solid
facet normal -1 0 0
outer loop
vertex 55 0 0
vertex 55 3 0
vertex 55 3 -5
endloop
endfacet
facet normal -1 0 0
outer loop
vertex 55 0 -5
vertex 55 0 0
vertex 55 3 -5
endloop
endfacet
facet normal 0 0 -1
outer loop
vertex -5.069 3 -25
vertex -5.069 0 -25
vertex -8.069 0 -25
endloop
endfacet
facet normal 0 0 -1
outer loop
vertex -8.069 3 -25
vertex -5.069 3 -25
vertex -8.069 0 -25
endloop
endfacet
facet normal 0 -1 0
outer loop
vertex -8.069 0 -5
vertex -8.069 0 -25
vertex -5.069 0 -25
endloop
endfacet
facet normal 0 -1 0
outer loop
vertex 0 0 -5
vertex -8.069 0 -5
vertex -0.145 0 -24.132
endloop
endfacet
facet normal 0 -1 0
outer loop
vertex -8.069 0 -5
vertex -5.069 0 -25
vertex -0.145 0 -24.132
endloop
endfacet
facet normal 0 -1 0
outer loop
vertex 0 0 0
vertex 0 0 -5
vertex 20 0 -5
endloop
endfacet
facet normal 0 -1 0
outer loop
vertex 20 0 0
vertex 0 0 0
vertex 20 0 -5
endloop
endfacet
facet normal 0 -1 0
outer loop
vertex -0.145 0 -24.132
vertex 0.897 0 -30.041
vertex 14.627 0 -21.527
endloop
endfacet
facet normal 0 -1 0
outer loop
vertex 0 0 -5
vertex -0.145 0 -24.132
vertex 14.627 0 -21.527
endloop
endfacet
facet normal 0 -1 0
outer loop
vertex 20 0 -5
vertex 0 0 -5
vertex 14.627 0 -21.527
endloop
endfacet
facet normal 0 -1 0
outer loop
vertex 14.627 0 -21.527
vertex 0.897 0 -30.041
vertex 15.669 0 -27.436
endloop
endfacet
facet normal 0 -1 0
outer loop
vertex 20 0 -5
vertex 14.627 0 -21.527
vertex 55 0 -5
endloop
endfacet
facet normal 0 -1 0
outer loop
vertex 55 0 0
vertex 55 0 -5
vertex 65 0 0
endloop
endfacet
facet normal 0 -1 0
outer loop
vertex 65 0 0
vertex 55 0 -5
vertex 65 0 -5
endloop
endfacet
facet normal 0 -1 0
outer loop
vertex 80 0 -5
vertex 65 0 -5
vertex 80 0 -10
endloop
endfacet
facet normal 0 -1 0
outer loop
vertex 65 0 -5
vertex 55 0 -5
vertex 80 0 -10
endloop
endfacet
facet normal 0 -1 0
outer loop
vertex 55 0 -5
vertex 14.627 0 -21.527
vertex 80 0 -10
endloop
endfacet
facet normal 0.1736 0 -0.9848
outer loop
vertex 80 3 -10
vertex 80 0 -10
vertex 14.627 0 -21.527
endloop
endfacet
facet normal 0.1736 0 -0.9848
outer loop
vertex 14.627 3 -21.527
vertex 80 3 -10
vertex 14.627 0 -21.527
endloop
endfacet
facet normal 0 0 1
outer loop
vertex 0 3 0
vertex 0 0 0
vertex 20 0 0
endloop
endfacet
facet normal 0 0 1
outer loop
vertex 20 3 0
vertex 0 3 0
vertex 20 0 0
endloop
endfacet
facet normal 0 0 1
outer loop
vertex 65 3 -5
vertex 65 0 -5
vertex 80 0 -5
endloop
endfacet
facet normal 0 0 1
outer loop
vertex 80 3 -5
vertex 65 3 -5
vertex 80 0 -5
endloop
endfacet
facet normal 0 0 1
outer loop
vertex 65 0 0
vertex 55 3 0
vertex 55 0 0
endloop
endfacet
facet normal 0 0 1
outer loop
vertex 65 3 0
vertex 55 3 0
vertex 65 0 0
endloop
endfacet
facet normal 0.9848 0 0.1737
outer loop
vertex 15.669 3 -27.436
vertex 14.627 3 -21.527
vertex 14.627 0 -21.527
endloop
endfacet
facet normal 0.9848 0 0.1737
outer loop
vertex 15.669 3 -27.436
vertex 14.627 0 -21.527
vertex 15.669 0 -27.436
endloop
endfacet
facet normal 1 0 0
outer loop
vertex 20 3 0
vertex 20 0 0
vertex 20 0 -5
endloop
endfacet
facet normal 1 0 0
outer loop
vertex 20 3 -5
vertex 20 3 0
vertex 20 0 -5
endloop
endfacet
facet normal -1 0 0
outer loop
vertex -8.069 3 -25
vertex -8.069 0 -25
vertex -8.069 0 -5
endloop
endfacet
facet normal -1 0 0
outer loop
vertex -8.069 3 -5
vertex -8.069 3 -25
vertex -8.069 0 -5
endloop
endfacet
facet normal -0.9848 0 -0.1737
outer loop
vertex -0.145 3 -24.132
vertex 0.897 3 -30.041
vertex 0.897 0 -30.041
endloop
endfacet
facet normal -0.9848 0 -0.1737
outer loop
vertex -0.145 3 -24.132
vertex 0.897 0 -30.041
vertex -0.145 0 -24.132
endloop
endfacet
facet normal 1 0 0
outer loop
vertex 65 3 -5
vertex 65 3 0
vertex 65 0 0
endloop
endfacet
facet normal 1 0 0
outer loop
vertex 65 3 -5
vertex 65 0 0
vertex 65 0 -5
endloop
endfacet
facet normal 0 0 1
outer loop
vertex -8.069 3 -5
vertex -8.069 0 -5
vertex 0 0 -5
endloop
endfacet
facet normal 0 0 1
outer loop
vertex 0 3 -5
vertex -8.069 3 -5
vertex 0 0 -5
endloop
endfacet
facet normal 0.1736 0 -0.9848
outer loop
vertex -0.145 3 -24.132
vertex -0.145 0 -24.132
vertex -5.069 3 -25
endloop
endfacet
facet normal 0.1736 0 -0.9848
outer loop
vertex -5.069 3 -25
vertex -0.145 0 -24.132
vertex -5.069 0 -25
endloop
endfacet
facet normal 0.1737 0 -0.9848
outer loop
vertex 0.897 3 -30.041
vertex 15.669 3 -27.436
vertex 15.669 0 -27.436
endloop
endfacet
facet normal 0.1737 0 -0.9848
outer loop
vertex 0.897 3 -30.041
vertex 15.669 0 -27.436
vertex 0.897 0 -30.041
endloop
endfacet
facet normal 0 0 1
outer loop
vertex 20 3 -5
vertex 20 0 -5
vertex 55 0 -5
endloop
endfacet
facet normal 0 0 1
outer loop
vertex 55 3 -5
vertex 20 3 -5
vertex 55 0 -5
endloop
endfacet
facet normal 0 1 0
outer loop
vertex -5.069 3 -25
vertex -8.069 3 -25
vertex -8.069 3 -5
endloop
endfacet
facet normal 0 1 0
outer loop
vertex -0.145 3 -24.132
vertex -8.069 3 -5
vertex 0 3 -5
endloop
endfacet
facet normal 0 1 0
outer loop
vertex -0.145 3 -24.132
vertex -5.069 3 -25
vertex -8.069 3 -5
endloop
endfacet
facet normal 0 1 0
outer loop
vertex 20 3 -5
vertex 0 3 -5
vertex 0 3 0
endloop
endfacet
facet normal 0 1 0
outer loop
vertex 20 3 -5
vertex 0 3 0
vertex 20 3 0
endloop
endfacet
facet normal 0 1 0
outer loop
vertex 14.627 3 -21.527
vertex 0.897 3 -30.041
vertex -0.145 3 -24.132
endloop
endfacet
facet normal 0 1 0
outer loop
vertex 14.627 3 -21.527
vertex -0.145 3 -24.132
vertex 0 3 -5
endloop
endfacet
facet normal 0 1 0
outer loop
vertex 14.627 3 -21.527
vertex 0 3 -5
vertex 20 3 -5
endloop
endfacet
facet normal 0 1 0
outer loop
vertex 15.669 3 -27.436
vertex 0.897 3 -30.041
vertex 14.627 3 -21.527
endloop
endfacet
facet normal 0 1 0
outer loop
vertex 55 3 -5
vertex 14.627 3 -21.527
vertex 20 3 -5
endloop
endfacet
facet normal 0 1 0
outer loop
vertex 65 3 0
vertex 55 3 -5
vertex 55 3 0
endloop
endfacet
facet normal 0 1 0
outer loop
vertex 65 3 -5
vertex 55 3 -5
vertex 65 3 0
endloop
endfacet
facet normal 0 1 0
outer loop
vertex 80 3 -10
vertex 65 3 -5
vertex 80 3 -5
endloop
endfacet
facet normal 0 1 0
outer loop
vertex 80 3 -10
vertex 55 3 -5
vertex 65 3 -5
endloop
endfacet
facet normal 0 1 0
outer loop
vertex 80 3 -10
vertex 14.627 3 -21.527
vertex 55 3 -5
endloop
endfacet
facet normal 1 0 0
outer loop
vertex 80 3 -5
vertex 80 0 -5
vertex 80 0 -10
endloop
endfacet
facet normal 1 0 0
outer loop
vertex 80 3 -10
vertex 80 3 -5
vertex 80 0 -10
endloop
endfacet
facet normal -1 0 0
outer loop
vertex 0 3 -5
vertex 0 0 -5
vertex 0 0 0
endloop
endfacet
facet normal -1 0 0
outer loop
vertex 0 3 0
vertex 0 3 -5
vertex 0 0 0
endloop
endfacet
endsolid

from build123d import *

# Parameters (mm, degrees)
BOSS_EXTRUDE1_DEPTH = 3
SKETCH2_W           = 10
SKETCH2_H           = 5
BOSS_EXTRUDE2_DEPTH = 3
BOSS_EXTRUDE3_DEPTH = 3


with BuildPart() as part:
    # Sketch1 → Boss-Extrude1 (new body)
    with BuildSketch(Plane(origin=(0, 0, 0), x_dir=(1, 0, 0), z_dir=(0, 1, 0))):
        Polygon((20, 0), (20, 5), (80, 5), (80, 10), (-5.069227294, 25), (-8.069227294, 25), (-8.069227294, 5), (0, 5), (0, 0), align=None)
    extrude(amount=BOSS_EXTRUDE1_DEPTH)

    # Sketch2 → Boss-Extrude2 (add)
    with BuildSketch(Plane(origin=(0, 3, 0), x_dir=(1, 0, 0), z_dir=(0, 1, 0))):
        with Locations((60, 2.5)):
            Rectangle(SKETCH2_W, SKETCH2_H)
    extrude(amount=-BOSS_EXTRUDE2_DEPTH)

    # Sketch3 → Boss-Extrude3 (add)
    with BuildSketch(Plane(origin=(0, 3, 0), x_dir=(1, 0, 0), z_dir=(0, 1, 0))):
        Polygon((-0.145188529, 24.131759112), (14.626927766, 21.527036447), (15.668816832, 27.435882965), (0.896700537, 30.04060563), align=None)
    extrude(amount=-BOSS_EXTRUDE3_DEPTH)


solid = part.part
